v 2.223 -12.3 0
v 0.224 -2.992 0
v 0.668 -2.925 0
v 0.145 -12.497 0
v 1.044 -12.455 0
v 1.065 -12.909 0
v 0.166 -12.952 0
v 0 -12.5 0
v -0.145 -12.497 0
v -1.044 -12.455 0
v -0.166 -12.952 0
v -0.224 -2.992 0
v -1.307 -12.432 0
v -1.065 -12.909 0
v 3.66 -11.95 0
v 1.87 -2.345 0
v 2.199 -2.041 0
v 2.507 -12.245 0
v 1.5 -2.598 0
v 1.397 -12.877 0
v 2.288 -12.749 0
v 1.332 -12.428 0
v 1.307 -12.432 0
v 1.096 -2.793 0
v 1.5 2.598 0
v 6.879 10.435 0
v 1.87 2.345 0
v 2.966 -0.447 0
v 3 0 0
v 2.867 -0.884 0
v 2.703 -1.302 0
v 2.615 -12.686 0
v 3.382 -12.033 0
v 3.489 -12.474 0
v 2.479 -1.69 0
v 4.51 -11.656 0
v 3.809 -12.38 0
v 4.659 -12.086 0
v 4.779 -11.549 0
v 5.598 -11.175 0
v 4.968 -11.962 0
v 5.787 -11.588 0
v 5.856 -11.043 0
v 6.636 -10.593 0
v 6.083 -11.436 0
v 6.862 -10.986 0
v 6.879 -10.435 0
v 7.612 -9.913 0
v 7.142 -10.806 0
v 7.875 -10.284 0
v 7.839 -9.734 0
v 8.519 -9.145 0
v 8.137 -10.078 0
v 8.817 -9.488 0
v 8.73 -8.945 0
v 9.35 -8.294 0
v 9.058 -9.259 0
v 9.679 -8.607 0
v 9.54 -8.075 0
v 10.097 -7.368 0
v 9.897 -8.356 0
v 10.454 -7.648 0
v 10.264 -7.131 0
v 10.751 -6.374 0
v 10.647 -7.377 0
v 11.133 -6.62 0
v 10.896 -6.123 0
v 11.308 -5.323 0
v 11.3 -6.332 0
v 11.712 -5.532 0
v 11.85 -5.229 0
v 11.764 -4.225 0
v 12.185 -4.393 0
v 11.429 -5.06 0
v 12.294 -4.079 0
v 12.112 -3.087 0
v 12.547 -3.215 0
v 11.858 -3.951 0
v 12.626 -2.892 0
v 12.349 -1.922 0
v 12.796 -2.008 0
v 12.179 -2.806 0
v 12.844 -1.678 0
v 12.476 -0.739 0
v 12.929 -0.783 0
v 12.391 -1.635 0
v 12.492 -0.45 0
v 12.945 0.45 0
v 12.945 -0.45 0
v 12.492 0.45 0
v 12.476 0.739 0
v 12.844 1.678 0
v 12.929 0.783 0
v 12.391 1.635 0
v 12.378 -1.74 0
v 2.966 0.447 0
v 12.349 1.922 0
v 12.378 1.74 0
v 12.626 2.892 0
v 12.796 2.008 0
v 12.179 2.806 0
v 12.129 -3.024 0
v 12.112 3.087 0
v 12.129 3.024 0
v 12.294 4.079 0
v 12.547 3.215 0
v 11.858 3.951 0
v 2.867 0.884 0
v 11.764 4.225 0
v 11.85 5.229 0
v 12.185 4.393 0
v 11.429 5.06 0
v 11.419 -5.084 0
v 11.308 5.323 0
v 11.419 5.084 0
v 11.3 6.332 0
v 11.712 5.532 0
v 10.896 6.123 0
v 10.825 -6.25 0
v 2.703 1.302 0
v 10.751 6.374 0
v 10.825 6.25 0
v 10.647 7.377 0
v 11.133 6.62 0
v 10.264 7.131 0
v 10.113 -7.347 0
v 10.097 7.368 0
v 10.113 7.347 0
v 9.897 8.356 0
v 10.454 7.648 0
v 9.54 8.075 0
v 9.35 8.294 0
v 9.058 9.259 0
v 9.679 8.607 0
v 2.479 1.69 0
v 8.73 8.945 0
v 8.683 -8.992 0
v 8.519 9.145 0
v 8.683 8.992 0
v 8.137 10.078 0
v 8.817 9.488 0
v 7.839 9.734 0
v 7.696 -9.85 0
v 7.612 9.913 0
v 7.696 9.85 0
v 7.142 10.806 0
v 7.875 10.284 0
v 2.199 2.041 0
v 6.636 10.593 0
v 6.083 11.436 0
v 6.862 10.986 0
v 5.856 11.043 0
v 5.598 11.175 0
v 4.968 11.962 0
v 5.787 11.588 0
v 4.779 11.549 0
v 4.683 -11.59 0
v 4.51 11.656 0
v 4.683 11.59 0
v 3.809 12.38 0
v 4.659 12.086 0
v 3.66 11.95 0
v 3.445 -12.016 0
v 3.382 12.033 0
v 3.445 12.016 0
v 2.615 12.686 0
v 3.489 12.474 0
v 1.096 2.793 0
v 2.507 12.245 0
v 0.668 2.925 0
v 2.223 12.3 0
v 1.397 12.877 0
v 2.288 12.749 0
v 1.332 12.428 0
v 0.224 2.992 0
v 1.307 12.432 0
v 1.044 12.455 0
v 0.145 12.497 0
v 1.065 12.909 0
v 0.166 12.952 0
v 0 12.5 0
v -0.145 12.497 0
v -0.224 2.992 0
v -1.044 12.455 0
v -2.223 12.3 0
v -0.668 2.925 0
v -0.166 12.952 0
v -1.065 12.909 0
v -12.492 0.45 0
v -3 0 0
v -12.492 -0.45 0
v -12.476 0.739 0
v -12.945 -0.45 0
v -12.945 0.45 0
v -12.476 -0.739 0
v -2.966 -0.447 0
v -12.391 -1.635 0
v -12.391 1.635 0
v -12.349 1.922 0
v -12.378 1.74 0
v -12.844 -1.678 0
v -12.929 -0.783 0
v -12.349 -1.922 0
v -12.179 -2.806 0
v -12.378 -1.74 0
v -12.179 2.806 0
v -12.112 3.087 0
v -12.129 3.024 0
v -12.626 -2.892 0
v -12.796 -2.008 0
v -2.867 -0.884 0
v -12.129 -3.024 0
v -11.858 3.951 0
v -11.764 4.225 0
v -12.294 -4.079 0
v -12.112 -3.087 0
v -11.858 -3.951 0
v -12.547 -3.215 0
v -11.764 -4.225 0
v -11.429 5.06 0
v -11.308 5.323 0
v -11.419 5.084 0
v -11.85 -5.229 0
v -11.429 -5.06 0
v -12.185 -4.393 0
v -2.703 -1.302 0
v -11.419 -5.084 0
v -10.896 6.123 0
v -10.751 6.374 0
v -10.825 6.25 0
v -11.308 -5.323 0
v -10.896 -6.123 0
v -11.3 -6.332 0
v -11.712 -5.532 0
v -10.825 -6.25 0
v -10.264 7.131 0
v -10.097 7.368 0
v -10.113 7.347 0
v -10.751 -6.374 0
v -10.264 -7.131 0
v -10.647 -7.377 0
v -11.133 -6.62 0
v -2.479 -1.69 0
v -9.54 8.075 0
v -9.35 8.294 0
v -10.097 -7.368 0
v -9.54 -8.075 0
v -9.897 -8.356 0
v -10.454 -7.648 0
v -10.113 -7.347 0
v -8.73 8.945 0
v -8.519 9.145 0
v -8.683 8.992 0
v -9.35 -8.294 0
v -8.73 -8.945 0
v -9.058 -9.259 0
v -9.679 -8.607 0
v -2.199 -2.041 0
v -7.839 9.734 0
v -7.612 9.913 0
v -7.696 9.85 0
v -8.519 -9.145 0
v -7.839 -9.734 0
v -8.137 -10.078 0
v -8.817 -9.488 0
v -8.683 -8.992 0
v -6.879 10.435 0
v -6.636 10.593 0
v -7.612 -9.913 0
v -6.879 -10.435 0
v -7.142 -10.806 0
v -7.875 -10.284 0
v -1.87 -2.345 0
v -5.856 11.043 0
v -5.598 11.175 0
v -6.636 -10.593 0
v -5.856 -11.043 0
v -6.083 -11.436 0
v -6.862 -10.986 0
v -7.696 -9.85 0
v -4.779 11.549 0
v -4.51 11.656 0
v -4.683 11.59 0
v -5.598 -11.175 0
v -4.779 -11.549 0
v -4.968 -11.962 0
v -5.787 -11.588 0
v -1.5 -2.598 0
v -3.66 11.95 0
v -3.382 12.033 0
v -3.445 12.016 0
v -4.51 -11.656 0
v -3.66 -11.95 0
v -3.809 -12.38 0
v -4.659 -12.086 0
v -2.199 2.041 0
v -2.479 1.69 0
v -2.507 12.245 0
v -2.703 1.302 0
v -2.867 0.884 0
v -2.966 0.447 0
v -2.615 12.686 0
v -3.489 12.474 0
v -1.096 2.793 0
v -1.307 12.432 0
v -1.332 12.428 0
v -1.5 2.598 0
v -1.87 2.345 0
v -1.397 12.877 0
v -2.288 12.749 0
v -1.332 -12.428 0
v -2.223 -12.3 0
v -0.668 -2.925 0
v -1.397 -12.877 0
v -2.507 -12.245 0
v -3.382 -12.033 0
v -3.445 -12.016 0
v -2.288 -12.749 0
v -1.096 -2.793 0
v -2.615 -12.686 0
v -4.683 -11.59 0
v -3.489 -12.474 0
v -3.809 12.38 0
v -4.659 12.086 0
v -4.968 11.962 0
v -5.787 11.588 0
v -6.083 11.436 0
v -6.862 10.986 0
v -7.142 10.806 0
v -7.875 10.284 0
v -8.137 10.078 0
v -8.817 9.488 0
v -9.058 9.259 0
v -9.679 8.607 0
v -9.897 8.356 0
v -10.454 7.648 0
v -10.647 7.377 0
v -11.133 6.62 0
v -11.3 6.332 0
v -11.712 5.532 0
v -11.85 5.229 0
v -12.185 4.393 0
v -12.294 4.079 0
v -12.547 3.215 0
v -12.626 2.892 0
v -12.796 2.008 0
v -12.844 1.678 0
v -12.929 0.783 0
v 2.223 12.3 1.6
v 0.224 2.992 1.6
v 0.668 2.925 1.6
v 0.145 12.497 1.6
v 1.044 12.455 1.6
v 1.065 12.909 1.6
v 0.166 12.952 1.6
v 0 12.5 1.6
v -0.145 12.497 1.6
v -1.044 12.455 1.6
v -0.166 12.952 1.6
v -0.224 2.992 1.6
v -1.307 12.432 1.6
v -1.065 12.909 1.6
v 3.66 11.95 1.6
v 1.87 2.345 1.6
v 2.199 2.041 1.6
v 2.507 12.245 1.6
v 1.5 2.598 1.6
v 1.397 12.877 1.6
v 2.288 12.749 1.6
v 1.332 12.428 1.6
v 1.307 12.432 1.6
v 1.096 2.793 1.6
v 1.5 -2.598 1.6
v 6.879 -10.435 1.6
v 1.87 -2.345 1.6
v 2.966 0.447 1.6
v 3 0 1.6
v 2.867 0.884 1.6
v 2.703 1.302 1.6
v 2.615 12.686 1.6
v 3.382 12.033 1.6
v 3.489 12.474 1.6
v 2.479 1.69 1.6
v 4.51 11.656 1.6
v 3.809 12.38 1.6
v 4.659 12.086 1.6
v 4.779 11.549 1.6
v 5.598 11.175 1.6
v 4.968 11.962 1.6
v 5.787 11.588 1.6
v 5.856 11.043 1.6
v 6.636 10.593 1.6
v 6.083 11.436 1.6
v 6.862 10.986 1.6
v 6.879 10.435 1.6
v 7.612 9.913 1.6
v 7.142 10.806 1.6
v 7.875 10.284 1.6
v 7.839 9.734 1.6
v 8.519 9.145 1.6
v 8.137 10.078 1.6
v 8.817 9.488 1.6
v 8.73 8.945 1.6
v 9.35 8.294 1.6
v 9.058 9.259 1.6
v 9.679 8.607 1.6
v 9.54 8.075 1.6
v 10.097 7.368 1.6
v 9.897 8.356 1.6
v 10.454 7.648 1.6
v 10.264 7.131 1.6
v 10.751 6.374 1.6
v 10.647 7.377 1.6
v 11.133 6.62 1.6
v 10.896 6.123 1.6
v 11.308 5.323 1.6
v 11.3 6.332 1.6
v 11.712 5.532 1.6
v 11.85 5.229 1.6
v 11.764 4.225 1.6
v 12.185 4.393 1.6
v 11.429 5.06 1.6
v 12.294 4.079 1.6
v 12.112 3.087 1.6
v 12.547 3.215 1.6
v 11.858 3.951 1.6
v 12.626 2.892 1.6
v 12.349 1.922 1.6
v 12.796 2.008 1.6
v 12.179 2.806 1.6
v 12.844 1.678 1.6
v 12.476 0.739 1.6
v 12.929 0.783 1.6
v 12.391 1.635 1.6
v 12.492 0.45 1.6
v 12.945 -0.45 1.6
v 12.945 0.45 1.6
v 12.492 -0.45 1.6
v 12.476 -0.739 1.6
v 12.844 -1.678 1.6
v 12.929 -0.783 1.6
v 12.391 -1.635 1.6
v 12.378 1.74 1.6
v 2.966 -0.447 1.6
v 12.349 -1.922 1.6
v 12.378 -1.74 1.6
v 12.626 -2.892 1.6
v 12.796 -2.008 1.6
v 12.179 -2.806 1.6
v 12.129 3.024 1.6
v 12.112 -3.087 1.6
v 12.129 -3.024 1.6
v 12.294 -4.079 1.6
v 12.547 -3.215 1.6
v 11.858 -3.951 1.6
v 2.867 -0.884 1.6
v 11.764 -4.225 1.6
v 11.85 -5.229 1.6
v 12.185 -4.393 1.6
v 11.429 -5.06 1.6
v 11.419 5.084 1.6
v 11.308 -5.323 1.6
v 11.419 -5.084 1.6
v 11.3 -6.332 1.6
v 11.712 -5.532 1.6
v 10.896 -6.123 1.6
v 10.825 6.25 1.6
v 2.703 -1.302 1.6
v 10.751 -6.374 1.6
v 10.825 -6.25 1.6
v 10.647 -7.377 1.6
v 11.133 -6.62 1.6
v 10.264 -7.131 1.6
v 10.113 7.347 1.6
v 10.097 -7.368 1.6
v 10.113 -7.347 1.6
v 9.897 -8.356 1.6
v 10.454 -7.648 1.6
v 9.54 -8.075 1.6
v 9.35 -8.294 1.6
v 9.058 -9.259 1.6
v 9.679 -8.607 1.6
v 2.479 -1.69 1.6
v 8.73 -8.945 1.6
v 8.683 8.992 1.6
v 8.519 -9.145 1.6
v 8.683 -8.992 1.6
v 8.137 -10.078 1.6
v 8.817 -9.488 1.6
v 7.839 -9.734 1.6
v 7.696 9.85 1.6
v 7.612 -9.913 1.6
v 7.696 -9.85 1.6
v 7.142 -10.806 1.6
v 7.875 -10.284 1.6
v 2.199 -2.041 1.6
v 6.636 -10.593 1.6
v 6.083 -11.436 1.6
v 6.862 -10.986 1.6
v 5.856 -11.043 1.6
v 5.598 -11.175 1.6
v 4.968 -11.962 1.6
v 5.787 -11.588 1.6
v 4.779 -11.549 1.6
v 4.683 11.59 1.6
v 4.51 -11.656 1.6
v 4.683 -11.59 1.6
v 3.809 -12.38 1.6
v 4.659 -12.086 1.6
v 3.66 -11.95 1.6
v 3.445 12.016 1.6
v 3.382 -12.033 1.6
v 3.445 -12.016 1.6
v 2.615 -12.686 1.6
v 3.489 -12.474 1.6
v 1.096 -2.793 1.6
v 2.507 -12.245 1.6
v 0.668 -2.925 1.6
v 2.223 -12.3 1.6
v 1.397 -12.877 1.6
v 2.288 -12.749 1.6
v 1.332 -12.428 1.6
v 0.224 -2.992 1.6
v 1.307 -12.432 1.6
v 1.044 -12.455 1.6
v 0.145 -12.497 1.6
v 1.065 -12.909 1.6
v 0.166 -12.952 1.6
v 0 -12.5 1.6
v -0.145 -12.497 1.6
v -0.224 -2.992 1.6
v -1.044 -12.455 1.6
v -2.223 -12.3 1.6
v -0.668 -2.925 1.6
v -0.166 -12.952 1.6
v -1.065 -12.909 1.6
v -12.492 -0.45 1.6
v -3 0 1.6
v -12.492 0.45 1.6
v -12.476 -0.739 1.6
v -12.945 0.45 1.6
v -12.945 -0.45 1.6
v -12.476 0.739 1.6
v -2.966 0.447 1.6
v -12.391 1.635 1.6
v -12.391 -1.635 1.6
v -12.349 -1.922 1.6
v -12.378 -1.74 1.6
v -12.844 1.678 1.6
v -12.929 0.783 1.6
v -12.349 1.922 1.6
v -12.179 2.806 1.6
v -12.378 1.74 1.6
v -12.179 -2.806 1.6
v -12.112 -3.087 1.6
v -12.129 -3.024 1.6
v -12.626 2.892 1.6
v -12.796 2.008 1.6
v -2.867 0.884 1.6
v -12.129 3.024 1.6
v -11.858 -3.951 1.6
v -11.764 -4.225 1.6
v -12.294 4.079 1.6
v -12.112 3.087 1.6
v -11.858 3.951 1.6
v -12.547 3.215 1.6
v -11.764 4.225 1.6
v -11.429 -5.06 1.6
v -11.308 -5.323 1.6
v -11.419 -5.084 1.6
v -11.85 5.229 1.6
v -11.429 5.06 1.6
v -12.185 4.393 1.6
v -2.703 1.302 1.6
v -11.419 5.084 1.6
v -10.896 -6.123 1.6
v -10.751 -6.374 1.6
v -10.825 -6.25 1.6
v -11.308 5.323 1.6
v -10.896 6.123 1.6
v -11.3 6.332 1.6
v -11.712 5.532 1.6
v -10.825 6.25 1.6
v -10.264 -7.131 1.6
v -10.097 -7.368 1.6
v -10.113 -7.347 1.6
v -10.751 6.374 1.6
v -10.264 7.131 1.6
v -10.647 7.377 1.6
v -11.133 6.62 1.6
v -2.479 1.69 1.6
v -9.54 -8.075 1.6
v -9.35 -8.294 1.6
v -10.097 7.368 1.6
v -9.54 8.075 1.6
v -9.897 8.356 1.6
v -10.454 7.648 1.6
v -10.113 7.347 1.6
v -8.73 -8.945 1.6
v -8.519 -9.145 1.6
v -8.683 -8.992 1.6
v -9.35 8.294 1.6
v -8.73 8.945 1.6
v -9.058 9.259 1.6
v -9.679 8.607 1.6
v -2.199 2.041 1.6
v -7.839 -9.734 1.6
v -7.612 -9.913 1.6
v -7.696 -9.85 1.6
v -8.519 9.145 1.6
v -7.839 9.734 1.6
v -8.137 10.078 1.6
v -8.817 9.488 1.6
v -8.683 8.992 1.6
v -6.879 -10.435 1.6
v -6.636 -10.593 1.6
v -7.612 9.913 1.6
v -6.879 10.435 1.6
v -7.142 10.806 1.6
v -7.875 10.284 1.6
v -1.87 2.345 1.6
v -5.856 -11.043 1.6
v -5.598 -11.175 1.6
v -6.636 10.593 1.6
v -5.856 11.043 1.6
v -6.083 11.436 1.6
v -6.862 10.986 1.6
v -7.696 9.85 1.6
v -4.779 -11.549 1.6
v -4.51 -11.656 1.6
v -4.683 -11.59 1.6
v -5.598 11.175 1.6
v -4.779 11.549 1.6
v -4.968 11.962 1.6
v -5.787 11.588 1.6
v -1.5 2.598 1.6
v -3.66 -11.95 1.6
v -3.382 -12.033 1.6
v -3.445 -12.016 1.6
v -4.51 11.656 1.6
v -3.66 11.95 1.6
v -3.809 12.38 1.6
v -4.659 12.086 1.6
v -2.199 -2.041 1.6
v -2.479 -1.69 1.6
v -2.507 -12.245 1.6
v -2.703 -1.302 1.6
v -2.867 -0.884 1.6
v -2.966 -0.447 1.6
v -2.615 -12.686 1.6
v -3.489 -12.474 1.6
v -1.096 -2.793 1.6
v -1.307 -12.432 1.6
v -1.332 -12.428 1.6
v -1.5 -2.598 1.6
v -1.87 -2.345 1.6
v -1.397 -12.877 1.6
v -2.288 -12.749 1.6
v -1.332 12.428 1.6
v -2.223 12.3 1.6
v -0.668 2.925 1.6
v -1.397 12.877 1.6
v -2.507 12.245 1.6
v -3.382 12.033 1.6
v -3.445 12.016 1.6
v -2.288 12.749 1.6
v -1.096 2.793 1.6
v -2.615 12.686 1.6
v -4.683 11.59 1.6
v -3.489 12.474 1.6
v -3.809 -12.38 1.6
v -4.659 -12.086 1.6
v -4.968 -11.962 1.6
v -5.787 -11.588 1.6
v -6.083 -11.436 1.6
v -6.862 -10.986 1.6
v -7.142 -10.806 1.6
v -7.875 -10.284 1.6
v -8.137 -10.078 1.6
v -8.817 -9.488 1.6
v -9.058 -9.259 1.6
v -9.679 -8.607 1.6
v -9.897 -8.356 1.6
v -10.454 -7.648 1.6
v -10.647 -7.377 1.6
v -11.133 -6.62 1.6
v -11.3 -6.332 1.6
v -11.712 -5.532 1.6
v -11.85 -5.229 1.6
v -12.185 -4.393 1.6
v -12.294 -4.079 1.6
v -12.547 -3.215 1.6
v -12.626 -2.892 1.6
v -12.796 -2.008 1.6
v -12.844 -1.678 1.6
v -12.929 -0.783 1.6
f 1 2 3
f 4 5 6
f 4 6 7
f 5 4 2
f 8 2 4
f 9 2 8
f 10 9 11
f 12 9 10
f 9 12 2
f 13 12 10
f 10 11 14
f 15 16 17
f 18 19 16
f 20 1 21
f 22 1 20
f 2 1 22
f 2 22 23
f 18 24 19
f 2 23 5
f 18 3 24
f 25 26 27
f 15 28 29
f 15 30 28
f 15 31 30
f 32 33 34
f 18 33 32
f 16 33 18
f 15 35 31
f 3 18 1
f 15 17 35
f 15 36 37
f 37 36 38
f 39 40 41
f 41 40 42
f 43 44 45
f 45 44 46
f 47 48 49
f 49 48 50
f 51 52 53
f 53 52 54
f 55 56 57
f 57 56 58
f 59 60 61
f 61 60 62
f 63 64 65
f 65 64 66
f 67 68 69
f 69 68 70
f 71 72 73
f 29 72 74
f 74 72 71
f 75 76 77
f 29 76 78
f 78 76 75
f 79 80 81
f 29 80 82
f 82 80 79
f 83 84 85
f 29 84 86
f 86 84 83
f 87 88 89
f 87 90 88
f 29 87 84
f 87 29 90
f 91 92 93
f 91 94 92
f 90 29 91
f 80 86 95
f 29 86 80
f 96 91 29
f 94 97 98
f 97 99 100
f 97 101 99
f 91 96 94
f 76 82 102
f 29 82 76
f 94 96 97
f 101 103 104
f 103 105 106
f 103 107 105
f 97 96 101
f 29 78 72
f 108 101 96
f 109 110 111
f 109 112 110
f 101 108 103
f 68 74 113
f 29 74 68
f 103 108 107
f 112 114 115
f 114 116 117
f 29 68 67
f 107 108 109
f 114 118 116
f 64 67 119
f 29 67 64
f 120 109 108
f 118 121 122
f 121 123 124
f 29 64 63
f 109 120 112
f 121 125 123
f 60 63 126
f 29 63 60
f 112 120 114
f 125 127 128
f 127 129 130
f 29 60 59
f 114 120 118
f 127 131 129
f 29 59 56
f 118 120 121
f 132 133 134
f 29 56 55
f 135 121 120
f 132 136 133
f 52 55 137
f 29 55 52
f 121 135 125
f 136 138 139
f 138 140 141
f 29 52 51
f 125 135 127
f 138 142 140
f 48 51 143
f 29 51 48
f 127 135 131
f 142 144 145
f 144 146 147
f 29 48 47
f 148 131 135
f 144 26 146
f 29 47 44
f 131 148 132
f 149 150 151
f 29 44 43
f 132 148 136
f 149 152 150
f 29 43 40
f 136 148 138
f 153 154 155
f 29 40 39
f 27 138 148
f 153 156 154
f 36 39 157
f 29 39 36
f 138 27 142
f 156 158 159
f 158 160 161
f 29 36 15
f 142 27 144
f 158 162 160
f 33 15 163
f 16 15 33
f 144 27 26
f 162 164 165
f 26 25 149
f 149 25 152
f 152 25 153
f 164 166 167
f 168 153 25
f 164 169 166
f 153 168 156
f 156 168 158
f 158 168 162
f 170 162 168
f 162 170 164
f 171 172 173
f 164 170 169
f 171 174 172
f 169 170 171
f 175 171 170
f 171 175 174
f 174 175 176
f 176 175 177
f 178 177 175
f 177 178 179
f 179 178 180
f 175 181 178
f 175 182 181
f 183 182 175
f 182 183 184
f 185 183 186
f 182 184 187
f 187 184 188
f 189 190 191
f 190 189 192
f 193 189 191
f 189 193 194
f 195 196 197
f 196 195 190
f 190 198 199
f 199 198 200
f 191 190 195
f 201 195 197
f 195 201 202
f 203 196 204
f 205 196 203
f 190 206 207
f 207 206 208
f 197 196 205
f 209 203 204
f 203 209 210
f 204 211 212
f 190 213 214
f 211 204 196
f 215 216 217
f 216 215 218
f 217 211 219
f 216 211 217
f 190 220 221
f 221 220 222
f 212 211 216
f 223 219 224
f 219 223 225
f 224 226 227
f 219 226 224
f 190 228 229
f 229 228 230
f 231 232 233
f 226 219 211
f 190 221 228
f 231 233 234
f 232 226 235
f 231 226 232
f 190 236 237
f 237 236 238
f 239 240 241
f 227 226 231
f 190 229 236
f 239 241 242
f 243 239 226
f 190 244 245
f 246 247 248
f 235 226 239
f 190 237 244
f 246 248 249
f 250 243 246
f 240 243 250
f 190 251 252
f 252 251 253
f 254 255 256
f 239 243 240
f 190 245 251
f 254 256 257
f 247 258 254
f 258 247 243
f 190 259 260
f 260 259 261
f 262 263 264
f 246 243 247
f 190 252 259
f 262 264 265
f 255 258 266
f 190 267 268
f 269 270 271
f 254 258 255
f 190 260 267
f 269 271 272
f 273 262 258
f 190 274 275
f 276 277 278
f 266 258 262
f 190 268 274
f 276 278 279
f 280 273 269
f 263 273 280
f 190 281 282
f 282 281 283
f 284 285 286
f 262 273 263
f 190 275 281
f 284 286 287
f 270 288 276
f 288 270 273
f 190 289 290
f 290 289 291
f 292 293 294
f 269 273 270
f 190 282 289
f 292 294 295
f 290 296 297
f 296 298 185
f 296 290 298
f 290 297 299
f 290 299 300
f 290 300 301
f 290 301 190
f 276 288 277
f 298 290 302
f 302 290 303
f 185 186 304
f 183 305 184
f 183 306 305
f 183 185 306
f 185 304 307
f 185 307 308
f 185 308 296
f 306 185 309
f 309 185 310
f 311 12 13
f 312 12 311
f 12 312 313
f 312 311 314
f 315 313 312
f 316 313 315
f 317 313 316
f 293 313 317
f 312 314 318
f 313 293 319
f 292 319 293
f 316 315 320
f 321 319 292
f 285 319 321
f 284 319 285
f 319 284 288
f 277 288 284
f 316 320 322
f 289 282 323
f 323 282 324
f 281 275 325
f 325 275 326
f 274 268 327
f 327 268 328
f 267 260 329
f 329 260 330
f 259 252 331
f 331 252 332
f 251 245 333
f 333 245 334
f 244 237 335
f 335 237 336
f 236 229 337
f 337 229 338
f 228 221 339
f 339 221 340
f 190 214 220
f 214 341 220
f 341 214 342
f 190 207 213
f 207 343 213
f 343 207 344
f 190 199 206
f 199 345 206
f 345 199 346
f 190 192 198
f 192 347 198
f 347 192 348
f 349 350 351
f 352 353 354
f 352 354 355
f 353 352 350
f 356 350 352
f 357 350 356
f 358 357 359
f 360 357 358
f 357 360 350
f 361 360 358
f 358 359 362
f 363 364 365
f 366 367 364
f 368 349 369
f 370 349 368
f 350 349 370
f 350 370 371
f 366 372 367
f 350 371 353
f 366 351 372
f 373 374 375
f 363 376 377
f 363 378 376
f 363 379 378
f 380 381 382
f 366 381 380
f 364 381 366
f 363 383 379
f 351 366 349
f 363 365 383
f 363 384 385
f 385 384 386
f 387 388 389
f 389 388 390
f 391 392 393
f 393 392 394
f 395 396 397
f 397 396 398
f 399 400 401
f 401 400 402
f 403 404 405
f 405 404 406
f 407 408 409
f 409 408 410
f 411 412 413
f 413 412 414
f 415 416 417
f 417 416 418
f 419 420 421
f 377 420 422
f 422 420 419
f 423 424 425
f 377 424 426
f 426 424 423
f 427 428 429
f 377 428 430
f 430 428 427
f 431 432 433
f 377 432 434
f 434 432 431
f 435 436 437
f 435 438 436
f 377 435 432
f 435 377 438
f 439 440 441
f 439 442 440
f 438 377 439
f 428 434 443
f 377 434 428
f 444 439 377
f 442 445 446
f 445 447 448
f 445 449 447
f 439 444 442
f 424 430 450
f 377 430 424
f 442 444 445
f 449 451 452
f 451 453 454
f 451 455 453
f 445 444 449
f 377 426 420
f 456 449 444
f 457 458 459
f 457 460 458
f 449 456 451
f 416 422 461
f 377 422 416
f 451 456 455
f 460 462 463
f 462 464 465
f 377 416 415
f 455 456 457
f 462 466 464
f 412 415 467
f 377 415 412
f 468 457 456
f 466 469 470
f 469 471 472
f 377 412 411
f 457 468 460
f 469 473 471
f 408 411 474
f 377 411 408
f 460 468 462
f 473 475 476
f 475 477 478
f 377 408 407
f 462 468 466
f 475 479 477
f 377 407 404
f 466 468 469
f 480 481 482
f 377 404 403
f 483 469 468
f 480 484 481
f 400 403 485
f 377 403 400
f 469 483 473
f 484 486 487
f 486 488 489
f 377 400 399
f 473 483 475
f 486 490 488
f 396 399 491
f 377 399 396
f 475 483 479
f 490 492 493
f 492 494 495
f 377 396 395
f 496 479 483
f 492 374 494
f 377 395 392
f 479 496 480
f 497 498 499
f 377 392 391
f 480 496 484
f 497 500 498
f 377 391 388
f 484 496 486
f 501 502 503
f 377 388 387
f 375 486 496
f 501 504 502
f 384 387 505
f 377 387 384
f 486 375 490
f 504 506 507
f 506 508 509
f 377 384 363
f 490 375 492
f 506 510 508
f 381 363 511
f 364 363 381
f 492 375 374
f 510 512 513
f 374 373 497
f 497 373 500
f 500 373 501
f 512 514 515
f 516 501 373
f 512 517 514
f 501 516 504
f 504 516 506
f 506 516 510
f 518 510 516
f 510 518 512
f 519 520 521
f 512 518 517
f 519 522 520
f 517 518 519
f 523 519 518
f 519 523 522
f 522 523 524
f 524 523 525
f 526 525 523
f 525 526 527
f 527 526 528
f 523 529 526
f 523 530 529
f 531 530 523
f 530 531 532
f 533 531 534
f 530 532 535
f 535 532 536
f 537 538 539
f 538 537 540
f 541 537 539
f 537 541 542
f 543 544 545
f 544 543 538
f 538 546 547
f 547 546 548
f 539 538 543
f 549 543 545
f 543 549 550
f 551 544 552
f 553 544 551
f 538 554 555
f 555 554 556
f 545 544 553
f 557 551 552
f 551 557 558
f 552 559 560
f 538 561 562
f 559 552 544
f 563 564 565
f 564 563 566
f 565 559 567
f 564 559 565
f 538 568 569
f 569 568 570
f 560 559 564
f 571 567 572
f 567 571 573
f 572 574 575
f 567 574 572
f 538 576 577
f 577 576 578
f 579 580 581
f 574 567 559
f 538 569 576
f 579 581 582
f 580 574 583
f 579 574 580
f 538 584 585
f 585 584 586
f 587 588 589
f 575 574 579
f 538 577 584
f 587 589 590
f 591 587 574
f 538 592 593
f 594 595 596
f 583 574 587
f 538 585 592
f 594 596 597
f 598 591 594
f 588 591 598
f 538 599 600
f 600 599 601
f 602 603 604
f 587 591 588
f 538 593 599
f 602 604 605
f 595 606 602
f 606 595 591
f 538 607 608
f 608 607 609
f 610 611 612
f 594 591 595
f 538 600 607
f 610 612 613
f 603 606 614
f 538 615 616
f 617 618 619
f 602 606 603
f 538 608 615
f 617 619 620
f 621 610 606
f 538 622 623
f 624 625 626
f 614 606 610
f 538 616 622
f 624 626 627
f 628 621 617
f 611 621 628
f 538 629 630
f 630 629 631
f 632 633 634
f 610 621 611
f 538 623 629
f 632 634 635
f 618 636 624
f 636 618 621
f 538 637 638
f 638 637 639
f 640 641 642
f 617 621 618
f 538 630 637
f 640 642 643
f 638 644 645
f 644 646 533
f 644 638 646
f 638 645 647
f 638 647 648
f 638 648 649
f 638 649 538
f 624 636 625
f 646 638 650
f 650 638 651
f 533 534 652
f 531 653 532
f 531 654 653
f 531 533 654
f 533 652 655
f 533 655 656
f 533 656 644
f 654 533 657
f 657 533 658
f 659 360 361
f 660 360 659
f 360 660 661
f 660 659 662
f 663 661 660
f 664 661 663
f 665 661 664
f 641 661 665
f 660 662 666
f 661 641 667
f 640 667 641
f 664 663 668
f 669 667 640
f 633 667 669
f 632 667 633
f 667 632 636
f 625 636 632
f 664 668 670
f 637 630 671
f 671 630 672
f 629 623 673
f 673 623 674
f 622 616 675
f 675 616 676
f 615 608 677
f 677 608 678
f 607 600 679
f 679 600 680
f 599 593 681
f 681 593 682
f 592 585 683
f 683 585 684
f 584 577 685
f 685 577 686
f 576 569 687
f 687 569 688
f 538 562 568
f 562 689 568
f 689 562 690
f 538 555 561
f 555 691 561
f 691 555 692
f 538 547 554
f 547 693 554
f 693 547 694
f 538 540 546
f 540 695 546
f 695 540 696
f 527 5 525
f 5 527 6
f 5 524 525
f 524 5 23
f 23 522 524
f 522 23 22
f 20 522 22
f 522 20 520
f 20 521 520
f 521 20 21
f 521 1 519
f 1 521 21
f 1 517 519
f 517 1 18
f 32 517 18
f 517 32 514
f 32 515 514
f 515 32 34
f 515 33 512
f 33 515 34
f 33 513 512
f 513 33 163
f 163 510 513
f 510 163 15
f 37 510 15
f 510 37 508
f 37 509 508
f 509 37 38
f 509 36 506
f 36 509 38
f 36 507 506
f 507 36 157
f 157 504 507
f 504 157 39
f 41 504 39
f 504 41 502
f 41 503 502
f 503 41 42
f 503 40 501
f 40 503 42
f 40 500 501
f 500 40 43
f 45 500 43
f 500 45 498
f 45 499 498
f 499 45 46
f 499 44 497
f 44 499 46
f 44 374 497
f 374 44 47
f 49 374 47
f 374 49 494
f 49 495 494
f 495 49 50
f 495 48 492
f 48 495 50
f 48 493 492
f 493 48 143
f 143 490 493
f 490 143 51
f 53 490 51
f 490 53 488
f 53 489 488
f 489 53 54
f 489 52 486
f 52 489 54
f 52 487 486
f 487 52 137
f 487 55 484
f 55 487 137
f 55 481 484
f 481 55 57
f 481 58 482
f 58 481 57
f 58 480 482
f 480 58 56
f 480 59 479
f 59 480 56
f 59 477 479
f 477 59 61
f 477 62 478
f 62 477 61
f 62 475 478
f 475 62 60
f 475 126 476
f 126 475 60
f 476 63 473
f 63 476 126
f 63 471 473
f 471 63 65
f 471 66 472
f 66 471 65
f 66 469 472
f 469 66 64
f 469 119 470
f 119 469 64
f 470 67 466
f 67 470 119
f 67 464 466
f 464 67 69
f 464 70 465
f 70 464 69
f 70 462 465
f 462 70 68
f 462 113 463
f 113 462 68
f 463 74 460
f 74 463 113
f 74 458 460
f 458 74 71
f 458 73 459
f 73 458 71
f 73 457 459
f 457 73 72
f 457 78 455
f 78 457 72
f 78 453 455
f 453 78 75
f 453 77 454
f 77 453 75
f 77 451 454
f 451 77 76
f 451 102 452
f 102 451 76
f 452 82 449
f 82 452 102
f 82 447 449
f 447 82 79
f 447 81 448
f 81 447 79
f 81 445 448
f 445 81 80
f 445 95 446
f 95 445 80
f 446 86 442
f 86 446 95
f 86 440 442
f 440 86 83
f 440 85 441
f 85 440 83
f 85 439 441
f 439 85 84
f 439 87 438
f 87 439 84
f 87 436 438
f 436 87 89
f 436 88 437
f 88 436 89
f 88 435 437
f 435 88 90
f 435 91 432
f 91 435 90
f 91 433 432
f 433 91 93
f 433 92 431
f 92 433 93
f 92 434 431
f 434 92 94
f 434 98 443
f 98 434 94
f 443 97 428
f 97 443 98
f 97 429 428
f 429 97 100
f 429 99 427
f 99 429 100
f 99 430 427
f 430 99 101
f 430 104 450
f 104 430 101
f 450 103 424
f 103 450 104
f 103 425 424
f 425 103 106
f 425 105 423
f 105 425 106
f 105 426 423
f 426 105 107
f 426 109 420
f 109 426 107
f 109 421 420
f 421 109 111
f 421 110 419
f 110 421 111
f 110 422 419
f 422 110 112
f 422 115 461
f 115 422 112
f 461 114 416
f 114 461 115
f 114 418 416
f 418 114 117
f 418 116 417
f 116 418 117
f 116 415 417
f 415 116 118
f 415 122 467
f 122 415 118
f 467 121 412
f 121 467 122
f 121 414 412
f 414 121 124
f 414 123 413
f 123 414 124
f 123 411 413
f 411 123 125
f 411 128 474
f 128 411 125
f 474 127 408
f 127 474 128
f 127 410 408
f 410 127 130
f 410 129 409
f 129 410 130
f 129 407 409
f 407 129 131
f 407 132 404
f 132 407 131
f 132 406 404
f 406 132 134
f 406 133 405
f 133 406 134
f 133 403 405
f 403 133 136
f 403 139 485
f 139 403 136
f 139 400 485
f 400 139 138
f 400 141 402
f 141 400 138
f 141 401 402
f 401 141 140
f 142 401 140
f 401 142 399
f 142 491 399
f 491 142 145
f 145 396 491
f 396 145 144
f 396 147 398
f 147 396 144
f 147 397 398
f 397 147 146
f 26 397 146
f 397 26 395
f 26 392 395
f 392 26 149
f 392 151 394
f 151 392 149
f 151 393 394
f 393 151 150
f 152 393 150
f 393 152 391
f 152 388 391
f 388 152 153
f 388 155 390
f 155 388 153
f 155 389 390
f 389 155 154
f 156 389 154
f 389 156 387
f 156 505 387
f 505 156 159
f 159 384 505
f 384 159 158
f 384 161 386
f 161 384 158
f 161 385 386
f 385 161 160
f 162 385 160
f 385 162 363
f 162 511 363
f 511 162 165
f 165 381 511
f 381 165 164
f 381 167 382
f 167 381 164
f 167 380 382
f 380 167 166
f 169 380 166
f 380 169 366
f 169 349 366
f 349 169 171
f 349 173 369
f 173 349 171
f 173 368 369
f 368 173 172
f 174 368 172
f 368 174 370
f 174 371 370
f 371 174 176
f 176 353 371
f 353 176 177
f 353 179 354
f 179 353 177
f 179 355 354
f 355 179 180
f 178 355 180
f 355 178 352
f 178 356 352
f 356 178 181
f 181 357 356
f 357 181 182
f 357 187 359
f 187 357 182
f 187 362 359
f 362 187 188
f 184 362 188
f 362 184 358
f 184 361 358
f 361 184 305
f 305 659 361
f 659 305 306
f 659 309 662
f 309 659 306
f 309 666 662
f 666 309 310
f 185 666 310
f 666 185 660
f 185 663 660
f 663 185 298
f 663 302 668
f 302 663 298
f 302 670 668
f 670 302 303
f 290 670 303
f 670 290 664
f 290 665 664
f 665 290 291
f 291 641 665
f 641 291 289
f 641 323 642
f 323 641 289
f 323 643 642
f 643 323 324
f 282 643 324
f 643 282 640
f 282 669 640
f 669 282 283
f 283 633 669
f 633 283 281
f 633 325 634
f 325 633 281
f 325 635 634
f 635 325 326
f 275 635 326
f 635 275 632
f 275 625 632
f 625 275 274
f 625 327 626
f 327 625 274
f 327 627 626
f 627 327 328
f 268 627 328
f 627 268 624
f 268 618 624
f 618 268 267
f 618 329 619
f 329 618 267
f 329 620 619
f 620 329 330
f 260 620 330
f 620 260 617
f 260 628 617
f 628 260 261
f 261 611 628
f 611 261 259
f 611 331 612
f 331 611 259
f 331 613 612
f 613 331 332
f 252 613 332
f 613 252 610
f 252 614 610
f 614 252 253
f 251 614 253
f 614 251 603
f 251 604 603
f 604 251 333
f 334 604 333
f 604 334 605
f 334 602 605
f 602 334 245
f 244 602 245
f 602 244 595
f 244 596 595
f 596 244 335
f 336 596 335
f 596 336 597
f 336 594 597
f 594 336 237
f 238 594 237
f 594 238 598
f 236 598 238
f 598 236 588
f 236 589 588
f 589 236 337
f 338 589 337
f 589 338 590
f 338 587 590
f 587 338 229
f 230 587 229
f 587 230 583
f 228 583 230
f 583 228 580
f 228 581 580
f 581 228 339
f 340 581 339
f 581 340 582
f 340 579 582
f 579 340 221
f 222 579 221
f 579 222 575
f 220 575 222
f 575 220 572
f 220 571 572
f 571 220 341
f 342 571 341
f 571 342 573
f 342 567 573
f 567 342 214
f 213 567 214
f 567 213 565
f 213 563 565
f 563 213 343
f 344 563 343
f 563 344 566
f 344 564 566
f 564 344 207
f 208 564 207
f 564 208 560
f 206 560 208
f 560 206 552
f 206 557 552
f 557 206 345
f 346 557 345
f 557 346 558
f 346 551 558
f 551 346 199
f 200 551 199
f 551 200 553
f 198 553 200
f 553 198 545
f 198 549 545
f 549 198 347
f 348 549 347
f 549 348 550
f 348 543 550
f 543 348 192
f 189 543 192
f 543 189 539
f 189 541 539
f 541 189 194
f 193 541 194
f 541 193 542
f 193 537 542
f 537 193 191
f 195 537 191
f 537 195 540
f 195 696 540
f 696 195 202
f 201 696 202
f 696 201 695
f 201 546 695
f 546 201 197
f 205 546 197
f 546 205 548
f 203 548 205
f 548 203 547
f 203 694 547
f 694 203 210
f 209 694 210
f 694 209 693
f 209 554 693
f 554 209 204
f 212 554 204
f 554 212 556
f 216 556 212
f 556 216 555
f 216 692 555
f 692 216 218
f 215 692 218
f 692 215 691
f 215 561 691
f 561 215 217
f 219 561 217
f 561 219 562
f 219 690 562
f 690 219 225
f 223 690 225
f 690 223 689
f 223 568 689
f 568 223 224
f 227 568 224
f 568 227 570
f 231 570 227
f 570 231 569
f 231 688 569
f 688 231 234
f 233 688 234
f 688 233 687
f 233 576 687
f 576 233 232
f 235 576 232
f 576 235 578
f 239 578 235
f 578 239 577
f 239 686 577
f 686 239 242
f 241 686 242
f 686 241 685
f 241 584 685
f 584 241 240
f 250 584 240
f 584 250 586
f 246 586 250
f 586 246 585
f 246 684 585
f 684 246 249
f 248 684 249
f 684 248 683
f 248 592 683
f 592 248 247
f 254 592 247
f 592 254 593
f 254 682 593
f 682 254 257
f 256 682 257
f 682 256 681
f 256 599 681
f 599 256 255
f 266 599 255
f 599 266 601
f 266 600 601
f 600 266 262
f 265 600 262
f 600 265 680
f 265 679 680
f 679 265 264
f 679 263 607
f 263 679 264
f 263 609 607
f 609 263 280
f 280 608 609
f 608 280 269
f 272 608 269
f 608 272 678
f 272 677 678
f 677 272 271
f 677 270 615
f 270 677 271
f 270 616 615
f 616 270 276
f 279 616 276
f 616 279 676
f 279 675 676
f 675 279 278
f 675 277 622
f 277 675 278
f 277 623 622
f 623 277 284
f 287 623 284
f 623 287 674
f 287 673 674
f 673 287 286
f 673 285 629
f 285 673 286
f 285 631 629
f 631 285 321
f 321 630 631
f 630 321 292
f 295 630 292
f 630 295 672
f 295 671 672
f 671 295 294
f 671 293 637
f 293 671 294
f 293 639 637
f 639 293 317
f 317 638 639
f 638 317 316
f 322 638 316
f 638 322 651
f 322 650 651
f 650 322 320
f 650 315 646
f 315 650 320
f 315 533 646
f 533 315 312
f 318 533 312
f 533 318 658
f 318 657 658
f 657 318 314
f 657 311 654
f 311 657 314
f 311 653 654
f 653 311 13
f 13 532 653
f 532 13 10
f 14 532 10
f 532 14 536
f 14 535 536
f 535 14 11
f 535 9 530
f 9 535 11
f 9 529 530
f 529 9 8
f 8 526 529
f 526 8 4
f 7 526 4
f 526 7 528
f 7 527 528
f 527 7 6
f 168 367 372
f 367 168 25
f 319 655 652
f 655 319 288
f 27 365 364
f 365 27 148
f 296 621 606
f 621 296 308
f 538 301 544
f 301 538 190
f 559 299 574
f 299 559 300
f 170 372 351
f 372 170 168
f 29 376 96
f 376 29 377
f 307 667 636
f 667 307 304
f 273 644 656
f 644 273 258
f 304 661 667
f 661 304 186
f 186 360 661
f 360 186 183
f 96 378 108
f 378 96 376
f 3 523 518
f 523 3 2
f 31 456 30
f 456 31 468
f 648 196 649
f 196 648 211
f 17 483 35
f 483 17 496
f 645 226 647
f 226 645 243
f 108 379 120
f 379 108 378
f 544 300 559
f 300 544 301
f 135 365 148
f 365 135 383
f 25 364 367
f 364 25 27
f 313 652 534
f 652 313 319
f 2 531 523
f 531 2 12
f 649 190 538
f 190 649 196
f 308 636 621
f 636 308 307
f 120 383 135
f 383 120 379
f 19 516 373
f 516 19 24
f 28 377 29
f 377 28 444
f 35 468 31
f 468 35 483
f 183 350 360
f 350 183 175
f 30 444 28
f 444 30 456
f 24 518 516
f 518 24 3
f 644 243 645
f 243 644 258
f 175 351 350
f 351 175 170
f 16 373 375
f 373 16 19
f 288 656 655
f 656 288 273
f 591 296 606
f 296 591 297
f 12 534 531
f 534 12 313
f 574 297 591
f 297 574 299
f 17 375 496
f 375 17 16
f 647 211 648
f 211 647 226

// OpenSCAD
// part_id: i1
// name: Exeligmos gear
// source_drawing_ids: DRW-009
// units: mm
// revision: 0.1
// SPDX-License-Identifier: MIT

module part_i1(
    outer_r = 13.39,
    root_r = 12.50,
    thickness = 1.6,
    bore_d = 6.0,
    teeth = 66
) {
    difference() {
        linear_extrude(height = thickness)
        union() {
            circle(r = root_r, $fn = 180);
            for (i = [0 : teeth - 1]) {
                a = i * 360 / teeth;
                rotate([0, 0, a]) translate([root_r, 0, 0]) square([outer_r - root_r, 0.9], center = true);
            }
        }
        translate([0, 0, -0.05]) cylinder(d = bore_d, h = thickness + 0.1, $fn = 42);
    }
}

// ---- "main guard" ----
// Default to previewing when opened directly:
if (is_undef(__LIB_MODE__)) {
    part_i1();
}
